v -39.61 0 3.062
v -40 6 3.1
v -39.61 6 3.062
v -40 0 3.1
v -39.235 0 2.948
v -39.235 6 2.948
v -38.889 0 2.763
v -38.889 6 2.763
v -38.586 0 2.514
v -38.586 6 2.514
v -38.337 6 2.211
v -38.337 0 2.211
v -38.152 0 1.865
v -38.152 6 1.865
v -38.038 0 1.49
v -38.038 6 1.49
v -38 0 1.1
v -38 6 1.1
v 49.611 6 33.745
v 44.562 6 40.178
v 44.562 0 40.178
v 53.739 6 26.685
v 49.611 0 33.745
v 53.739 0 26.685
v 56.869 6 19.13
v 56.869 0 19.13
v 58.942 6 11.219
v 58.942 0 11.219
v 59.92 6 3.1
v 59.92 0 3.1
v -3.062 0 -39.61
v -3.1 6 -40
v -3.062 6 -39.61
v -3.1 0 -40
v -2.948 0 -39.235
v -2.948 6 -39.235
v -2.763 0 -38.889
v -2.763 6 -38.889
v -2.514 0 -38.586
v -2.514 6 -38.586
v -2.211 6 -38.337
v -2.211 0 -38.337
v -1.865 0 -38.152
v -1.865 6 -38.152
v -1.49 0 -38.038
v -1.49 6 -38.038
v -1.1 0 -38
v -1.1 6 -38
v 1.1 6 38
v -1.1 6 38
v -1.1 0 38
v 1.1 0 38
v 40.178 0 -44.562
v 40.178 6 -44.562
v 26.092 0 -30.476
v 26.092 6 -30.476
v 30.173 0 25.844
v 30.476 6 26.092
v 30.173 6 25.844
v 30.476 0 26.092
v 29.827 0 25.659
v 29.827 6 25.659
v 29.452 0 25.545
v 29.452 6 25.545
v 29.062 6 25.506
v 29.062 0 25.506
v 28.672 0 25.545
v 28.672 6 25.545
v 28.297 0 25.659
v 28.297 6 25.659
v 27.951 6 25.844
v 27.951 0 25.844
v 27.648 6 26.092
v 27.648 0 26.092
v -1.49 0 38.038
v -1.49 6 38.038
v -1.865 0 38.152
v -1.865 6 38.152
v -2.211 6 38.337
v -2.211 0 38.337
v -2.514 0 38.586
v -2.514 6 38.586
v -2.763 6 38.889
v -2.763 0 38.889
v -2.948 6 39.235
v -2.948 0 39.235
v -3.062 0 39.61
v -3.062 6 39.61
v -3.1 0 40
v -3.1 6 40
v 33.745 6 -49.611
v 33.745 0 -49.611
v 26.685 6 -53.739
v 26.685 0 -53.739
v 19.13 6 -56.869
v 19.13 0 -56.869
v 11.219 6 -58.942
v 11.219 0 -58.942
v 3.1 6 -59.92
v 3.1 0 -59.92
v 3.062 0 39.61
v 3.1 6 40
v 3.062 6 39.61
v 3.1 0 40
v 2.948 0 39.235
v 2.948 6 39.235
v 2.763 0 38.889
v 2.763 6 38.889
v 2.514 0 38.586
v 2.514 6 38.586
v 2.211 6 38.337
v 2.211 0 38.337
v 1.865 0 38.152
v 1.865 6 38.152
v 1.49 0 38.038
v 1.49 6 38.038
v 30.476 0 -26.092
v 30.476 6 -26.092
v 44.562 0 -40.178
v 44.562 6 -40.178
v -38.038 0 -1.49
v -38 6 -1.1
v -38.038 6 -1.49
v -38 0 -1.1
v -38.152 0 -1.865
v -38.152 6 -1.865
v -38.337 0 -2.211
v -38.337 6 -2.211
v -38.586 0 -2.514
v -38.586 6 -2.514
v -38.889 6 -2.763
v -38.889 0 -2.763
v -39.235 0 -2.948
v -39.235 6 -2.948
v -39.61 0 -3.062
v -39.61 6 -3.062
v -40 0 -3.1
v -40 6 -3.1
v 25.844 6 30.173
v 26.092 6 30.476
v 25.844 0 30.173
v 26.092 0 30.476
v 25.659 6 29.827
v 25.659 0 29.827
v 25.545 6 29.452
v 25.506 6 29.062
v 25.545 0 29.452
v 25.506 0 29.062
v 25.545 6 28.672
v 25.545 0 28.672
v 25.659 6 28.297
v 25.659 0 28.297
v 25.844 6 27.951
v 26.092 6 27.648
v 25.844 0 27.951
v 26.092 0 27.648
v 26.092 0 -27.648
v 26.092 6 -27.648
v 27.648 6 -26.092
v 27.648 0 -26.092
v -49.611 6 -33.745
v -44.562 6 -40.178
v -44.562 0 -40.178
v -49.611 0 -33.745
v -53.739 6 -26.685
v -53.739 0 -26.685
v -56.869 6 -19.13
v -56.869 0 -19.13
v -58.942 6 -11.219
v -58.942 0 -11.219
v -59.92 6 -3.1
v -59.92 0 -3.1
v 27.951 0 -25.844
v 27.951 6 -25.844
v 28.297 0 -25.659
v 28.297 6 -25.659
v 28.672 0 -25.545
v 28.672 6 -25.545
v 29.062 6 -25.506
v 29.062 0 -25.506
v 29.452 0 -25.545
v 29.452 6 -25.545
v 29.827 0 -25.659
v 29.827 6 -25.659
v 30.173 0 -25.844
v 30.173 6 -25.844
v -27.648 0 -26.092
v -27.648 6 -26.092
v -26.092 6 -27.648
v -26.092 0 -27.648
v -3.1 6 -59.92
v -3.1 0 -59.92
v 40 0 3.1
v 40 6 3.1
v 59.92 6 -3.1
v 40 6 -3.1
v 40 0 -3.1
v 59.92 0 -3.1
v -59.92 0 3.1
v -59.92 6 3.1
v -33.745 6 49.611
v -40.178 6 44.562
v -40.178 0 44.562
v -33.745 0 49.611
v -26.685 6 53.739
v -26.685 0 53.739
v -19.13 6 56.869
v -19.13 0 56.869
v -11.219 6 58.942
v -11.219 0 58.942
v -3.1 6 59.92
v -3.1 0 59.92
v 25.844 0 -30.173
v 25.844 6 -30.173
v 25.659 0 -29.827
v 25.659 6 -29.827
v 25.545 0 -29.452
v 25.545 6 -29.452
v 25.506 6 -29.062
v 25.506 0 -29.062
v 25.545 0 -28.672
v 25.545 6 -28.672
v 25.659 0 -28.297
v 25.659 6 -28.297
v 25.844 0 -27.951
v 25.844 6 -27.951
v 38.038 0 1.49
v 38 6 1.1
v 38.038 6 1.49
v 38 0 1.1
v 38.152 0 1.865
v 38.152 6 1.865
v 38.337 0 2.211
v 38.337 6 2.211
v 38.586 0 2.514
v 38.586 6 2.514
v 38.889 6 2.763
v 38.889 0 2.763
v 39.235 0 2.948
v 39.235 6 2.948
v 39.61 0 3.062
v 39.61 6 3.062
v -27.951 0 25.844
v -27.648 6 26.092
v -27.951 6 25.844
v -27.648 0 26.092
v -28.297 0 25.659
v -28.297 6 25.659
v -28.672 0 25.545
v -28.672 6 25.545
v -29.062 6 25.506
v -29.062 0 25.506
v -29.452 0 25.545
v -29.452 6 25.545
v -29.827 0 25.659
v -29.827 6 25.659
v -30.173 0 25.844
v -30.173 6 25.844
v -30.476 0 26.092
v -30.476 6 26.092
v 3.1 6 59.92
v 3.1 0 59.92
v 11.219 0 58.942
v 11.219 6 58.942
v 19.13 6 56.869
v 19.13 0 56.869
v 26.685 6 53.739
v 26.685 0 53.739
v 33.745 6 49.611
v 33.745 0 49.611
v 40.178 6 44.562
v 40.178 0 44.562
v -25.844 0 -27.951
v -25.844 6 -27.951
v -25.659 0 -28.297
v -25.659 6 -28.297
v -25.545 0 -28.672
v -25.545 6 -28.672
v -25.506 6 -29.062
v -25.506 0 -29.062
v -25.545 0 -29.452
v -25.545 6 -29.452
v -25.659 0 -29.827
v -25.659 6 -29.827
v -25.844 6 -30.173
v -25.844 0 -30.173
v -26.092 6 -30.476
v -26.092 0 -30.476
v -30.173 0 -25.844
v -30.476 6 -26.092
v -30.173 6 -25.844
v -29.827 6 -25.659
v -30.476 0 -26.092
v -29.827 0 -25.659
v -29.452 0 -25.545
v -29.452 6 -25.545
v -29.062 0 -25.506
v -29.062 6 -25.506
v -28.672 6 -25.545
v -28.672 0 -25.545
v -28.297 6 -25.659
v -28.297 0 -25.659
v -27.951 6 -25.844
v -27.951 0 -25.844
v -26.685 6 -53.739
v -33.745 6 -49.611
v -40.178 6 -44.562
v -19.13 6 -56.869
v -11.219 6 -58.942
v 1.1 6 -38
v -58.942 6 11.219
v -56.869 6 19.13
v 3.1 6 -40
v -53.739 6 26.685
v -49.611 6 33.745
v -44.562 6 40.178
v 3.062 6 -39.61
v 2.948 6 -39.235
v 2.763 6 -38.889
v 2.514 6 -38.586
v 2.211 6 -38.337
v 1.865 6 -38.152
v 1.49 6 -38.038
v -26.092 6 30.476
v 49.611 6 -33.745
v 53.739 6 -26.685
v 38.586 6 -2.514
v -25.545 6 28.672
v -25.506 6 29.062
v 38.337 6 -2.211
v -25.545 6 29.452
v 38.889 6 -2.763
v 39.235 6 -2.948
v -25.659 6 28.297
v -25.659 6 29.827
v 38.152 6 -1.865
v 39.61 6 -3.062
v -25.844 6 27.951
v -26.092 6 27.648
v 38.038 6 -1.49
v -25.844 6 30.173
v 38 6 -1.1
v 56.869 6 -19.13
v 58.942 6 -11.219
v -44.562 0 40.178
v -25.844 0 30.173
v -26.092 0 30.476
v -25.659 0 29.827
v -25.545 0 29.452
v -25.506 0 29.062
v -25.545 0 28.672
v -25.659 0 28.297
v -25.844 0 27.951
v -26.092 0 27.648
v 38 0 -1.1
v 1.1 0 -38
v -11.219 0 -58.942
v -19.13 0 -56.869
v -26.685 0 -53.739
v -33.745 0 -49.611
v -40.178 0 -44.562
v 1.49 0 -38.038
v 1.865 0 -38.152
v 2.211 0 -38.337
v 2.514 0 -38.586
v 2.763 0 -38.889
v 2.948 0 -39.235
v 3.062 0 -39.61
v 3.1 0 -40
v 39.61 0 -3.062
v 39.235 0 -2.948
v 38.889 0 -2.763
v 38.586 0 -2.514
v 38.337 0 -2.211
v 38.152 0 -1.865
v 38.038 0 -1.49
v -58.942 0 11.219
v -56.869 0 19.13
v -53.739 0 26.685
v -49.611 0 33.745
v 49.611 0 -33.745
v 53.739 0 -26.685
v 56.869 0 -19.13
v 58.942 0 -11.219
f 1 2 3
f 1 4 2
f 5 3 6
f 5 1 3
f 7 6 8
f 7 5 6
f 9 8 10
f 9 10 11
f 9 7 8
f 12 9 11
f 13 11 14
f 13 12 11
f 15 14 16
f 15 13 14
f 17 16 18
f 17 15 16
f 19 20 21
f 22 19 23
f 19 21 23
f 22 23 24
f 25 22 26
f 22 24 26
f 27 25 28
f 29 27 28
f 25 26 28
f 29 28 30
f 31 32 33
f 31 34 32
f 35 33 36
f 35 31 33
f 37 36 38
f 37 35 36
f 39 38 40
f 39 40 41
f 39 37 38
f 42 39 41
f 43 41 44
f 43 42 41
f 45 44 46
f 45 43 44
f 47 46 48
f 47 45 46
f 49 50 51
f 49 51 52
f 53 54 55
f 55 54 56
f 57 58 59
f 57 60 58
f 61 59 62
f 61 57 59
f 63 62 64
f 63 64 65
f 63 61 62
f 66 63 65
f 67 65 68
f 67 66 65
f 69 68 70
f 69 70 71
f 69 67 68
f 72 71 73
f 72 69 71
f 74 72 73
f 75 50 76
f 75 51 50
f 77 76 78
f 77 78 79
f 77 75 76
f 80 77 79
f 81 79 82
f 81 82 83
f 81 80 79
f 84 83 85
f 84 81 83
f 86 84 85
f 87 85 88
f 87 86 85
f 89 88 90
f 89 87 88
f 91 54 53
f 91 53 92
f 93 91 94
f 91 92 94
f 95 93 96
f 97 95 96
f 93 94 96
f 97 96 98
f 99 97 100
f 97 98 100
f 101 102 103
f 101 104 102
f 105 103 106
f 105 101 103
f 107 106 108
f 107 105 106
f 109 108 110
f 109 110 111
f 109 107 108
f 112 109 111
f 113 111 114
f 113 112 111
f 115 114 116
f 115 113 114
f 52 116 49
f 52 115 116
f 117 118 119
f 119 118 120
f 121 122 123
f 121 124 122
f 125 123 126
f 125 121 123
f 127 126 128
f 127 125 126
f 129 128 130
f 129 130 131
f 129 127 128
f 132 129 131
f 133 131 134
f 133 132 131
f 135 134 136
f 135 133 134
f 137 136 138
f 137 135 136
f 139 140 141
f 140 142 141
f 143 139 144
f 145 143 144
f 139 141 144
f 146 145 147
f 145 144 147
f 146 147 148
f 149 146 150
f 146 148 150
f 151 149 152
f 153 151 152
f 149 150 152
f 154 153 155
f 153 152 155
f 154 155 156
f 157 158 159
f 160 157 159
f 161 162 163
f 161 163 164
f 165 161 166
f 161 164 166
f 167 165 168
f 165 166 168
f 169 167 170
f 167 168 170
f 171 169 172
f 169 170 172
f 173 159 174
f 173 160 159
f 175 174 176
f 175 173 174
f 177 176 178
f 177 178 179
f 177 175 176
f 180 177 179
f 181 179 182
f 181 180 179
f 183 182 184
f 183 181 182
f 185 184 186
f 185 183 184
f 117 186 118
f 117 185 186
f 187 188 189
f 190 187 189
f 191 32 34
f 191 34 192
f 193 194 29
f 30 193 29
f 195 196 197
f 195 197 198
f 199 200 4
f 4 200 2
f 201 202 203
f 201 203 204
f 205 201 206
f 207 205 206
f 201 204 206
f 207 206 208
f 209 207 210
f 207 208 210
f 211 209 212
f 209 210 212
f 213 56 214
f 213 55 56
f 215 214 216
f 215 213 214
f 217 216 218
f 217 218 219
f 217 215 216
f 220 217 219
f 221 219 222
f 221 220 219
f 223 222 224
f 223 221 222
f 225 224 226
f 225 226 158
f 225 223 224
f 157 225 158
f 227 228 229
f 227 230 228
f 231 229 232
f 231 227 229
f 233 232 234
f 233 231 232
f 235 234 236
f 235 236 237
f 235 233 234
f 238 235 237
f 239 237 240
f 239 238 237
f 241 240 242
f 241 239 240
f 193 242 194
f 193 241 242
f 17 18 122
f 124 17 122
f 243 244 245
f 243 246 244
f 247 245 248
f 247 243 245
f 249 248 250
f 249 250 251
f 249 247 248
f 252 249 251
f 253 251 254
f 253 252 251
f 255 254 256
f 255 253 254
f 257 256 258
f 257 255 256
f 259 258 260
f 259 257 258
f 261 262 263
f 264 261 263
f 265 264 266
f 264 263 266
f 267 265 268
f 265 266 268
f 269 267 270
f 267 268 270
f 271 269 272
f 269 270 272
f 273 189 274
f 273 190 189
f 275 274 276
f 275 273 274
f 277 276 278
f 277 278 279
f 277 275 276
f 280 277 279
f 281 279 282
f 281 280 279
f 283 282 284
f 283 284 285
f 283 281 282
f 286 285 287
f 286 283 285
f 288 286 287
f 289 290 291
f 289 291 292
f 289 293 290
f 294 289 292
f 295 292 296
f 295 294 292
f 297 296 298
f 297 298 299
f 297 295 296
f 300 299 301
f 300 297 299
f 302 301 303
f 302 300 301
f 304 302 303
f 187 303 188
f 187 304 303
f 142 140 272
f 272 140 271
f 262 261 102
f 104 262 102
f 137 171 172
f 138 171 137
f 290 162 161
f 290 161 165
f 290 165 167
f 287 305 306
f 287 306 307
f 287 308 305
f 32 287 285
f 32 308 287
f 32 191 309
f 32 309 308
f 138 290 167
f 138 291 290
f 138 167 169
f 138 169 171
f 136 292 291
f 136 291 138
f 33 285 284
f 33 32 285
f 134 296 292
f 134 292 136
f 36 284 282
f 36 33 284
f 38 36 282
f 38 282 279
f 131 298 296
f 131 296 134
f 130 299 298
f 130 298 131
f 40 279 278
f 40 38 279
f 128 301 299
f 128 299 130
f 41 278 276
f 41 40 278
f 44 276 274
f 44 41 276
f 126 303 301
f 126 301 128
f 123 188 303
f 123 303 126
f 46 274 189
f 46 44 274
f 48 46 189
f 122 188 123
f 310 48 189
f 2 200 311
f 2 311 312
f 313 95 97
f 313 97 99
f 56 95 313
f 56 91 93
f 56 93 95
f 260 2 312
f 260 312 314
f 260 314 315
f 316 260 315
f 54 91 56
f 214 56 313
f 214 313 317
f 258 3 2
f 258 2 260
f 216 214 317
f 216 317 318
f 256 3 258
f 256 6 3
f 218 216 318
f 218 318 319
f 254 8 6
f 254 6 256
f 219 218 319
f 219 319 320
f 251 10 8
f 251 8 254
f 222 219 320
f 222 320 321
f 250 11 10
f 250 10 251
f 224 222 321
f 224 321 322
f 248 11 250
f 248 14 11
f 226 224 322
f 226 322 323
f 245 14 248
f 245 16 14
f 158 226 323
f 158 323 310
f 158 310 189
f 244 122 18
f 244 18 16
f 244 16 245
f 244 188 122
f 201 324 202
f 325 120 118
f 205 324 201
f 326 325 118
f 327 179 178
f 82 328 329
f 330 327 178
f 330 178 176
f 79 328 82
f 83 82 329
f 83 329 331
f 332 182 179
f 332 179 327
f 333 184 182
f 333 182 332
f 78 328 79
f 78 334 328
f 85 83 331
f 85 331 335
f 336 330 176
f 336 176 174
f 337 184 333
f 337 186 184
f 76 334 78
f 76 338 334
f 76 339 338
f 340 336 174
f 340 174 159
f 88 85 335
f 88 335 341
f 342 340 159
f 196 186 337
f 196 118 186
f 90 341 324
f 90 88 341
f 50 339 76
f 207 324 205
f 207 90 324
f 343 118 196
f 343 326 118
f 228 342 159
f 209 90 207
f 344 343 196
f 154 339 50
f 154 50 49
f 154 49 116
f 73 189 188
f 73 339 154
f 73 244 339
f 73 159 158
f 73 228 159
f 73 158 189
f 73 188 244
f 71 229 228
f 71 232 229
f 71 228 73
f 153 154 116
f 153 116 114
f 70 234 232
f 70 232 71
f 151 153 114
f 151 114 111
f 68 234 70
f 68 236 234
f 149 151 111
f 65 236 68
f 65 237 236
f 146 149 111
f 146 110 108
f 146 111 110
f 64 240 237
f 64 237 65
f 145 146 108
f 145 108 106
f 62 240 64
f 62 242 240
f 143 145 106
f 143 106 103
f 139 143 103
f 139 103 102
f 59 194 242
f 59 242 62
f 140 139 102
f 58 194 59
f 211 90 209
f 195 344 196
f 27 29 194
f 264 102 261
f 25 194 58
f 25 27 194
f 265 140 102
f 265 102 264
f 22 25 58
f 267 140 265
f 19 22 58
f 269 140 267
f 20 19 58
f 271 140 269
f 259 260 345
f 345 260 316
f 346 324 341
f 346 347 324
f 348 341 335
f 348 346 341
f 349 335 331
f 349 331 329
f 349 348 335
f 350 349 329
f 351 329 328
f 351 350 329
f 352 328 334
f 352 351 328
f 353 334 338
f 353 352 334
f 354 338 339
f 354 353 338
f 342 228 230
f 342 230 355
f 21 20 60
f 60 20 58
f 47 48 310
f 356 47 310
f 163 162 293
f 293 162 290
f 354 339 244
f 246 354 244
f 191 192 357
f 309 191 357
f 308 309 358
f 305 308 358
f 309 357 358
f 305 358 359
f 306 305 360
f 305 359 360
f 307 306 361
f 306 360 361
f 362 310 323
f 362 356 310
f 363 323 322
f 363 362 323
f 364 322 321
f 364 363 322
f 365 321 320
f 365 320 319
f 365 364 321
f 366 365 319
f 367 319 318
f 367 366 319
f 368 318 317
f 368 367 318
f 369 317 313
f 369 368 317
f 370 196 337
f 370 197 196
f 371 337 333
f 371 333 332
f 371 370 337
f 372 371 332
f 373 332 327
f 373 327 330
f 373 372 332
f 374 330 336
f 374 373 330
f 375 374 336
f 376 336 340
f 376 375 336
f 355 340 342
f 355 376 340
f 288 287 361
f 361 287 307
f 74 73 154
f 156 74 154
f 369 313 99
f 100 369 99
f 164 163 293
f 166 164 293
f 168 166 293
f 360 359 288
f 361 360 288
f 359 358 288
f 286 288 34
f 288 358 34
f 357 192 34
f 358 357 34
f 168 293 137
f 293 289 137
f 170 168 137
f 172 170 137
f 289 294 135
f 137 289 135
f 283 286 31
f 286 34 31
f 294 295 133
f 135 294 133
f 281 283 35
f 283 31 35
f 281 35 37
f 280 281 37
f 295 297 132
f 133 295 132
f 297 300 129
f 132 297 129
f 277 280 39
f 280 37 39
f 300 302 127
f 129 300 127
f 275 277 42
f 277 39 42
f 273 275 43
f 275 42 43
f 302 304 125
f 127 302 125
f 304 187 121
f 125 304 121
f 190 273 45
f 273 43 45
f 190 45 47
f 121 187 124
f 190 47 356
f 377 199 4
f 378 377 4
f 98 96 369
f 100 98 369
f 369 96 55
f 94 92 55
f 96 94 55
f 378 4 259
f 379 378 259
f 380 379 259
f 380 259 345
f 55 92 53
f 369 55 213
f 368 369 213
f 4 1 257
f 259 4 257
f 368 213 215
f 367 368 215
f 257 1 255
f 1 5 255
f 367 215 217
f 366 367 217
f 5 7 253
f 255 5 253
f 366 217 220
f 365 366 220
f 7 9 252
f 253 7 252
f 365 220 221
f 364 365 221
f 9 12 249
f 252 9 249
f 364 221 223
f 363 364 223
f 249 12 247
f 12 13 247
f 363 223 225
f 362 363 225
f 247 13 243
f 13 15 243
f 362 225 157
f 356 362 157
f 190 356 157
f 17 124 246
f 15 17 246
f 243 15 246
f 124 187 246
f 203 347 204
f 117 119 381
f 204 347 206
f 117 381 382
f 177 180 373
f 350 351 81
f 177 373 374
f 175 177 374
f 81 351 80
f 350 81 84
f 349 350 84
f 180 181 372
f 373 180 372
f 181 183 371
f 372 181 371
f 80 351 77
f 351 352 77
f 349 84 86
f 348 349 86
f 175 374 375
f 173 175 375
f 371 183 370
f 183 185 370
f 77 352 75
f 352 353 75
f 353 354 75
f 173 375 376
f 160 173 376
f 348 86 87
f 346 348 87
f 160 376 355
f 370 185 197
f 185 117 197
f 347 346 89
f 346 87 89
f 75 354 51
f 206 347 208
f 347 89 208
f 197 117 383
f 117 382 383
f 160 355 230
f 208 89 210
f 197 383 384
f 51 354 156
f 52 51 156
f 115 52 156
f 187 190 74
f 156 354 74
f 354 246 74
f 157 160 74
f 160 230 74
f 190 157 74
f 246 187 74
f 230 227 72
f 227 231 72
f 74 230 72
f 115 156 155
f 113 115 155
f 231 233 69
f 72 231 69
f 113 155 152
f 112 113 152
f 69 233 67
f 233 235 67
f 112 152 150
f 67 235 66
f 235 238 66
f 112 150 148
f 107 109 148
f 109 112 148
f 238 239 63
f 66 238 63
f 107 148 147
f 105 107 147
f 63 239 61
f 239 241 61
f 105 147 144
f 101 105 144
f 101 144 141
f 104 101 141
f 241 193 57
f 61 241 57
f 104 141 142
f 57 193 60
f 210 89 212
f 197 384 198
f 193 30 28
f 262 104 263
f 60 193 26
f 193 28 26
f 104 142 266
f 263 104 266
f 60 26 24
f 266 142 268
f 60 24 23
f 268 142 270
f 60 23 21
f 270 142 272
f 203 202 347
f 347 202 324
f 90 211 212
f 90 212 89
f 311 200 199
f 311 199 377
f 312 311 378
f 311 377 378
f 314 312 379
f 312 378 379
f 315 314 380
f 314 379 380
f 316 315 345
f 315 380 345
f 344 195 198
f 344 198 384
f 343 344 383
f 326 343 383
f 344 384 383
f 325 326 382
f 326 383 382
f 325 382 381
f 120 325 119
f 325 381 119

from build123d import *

# Parameters (mm, degrees)
SKETCH_2_R          = 60
EXTRUDE_1_DEPTH     = 6
SKETCH_3_W          = 60
SKETCH_3_H          = 6.2
SKETCH_3_W_2        = 6.2
SKETCH_3_H_2        = 60
CUT_EXTRUDE_1_DEPTH = 6
FILLET_1_R          = 2


with BuildPart() as part:
    # 草图2 → 凸台-拉伸1 (new body)
    with BuildSketch(Plane(origin=(0, 0, 0), x_dir=(1, 0, 0), z_dir=(0, 1, 0))):
        with Locations(Location((0, 0, 0), (0, 0, 270))):
            Circle(SKETCH_2_R)
    extrude(amount=EXTRUDE_1_DEPTH)

    # 草图3 → 切除-拉伸1 (cut)
    with BuildSketch(Plane(origin=(0, 6, 0), x_dir=(1, 0, 0), z_dir=(0, 1, 0))):
        with Locations((68, 0)):
            Rectangle(SKETCH_3_W, SKETCH_3_H)
        Polygon((24.678026663, -29.062088707), (67.104433535, -71.488495578), (71.488495578, -67.104433535), (29.062088707, -24.678026663), align=None)
        with Locations((0, -68)):
            Rectangle(SKETCH_3_W_2, SKETCH_3_H_2)
        Polygon((-29.062088707, -24.678026663), (-71.488495578, -67.104433535), (-67.104433535, -71.488495578), (-24.678026663, -29.062088707), align=None)
        with Locations((-68, 0)):
            Rectangle(SKETCH_3_W, SKETCH_3_H)
        Polygon((-24.678026663, 29.062088707), (-67.104433535, 71.488495578), (-71.488495578, 67.104433535), (-29.062088707, 24.678026663), align=None)
        with Locations((0, 68)):
            Rectangle(SKETCH_3_W_2, SKETCH_3_H_2)
        Polygon((29.062088707, 24.678026663), (71.488495578, 67.104433535), (67.104433535, 71.488495578), (24.678026663, 29.062088707), align=None)
    extrude(amount=-CUT_EXTRUDE_1_DEPTH, mode=Mode.SUBTRACT)

    # 圆角1
    fillet_1_edges = [part.edges().sort_by_distance(p)[0] for p in [
        (29.062088707, 3, 24.678026663),
        (24.678026663, 3, 29.062088707),
        (38, 3, -3.1),
        (38, 3, 3.1),
        (24.678026663, 3, -29.062088707),
        (29.062088707, 3, -24.678026663),
        (-3.1, 3, -38),
        (3.1, 3, -38),
        (-29.062088707, 3, -24.678026663),
        (-24.678026663, 3, -29.062088707),
        (-38, 3, 3.1),
        (-38, 3, -3.1),
        (-24.678026663, 3, 29.062088707),
        (-29.062088707, 3, 24.678026663),
        (3.1, 3, 38),
        (-3.1, 3, 38),
    ]]
    fillet(fillet_1_edges, radius=FILLET_1_R)


solid = part.part
